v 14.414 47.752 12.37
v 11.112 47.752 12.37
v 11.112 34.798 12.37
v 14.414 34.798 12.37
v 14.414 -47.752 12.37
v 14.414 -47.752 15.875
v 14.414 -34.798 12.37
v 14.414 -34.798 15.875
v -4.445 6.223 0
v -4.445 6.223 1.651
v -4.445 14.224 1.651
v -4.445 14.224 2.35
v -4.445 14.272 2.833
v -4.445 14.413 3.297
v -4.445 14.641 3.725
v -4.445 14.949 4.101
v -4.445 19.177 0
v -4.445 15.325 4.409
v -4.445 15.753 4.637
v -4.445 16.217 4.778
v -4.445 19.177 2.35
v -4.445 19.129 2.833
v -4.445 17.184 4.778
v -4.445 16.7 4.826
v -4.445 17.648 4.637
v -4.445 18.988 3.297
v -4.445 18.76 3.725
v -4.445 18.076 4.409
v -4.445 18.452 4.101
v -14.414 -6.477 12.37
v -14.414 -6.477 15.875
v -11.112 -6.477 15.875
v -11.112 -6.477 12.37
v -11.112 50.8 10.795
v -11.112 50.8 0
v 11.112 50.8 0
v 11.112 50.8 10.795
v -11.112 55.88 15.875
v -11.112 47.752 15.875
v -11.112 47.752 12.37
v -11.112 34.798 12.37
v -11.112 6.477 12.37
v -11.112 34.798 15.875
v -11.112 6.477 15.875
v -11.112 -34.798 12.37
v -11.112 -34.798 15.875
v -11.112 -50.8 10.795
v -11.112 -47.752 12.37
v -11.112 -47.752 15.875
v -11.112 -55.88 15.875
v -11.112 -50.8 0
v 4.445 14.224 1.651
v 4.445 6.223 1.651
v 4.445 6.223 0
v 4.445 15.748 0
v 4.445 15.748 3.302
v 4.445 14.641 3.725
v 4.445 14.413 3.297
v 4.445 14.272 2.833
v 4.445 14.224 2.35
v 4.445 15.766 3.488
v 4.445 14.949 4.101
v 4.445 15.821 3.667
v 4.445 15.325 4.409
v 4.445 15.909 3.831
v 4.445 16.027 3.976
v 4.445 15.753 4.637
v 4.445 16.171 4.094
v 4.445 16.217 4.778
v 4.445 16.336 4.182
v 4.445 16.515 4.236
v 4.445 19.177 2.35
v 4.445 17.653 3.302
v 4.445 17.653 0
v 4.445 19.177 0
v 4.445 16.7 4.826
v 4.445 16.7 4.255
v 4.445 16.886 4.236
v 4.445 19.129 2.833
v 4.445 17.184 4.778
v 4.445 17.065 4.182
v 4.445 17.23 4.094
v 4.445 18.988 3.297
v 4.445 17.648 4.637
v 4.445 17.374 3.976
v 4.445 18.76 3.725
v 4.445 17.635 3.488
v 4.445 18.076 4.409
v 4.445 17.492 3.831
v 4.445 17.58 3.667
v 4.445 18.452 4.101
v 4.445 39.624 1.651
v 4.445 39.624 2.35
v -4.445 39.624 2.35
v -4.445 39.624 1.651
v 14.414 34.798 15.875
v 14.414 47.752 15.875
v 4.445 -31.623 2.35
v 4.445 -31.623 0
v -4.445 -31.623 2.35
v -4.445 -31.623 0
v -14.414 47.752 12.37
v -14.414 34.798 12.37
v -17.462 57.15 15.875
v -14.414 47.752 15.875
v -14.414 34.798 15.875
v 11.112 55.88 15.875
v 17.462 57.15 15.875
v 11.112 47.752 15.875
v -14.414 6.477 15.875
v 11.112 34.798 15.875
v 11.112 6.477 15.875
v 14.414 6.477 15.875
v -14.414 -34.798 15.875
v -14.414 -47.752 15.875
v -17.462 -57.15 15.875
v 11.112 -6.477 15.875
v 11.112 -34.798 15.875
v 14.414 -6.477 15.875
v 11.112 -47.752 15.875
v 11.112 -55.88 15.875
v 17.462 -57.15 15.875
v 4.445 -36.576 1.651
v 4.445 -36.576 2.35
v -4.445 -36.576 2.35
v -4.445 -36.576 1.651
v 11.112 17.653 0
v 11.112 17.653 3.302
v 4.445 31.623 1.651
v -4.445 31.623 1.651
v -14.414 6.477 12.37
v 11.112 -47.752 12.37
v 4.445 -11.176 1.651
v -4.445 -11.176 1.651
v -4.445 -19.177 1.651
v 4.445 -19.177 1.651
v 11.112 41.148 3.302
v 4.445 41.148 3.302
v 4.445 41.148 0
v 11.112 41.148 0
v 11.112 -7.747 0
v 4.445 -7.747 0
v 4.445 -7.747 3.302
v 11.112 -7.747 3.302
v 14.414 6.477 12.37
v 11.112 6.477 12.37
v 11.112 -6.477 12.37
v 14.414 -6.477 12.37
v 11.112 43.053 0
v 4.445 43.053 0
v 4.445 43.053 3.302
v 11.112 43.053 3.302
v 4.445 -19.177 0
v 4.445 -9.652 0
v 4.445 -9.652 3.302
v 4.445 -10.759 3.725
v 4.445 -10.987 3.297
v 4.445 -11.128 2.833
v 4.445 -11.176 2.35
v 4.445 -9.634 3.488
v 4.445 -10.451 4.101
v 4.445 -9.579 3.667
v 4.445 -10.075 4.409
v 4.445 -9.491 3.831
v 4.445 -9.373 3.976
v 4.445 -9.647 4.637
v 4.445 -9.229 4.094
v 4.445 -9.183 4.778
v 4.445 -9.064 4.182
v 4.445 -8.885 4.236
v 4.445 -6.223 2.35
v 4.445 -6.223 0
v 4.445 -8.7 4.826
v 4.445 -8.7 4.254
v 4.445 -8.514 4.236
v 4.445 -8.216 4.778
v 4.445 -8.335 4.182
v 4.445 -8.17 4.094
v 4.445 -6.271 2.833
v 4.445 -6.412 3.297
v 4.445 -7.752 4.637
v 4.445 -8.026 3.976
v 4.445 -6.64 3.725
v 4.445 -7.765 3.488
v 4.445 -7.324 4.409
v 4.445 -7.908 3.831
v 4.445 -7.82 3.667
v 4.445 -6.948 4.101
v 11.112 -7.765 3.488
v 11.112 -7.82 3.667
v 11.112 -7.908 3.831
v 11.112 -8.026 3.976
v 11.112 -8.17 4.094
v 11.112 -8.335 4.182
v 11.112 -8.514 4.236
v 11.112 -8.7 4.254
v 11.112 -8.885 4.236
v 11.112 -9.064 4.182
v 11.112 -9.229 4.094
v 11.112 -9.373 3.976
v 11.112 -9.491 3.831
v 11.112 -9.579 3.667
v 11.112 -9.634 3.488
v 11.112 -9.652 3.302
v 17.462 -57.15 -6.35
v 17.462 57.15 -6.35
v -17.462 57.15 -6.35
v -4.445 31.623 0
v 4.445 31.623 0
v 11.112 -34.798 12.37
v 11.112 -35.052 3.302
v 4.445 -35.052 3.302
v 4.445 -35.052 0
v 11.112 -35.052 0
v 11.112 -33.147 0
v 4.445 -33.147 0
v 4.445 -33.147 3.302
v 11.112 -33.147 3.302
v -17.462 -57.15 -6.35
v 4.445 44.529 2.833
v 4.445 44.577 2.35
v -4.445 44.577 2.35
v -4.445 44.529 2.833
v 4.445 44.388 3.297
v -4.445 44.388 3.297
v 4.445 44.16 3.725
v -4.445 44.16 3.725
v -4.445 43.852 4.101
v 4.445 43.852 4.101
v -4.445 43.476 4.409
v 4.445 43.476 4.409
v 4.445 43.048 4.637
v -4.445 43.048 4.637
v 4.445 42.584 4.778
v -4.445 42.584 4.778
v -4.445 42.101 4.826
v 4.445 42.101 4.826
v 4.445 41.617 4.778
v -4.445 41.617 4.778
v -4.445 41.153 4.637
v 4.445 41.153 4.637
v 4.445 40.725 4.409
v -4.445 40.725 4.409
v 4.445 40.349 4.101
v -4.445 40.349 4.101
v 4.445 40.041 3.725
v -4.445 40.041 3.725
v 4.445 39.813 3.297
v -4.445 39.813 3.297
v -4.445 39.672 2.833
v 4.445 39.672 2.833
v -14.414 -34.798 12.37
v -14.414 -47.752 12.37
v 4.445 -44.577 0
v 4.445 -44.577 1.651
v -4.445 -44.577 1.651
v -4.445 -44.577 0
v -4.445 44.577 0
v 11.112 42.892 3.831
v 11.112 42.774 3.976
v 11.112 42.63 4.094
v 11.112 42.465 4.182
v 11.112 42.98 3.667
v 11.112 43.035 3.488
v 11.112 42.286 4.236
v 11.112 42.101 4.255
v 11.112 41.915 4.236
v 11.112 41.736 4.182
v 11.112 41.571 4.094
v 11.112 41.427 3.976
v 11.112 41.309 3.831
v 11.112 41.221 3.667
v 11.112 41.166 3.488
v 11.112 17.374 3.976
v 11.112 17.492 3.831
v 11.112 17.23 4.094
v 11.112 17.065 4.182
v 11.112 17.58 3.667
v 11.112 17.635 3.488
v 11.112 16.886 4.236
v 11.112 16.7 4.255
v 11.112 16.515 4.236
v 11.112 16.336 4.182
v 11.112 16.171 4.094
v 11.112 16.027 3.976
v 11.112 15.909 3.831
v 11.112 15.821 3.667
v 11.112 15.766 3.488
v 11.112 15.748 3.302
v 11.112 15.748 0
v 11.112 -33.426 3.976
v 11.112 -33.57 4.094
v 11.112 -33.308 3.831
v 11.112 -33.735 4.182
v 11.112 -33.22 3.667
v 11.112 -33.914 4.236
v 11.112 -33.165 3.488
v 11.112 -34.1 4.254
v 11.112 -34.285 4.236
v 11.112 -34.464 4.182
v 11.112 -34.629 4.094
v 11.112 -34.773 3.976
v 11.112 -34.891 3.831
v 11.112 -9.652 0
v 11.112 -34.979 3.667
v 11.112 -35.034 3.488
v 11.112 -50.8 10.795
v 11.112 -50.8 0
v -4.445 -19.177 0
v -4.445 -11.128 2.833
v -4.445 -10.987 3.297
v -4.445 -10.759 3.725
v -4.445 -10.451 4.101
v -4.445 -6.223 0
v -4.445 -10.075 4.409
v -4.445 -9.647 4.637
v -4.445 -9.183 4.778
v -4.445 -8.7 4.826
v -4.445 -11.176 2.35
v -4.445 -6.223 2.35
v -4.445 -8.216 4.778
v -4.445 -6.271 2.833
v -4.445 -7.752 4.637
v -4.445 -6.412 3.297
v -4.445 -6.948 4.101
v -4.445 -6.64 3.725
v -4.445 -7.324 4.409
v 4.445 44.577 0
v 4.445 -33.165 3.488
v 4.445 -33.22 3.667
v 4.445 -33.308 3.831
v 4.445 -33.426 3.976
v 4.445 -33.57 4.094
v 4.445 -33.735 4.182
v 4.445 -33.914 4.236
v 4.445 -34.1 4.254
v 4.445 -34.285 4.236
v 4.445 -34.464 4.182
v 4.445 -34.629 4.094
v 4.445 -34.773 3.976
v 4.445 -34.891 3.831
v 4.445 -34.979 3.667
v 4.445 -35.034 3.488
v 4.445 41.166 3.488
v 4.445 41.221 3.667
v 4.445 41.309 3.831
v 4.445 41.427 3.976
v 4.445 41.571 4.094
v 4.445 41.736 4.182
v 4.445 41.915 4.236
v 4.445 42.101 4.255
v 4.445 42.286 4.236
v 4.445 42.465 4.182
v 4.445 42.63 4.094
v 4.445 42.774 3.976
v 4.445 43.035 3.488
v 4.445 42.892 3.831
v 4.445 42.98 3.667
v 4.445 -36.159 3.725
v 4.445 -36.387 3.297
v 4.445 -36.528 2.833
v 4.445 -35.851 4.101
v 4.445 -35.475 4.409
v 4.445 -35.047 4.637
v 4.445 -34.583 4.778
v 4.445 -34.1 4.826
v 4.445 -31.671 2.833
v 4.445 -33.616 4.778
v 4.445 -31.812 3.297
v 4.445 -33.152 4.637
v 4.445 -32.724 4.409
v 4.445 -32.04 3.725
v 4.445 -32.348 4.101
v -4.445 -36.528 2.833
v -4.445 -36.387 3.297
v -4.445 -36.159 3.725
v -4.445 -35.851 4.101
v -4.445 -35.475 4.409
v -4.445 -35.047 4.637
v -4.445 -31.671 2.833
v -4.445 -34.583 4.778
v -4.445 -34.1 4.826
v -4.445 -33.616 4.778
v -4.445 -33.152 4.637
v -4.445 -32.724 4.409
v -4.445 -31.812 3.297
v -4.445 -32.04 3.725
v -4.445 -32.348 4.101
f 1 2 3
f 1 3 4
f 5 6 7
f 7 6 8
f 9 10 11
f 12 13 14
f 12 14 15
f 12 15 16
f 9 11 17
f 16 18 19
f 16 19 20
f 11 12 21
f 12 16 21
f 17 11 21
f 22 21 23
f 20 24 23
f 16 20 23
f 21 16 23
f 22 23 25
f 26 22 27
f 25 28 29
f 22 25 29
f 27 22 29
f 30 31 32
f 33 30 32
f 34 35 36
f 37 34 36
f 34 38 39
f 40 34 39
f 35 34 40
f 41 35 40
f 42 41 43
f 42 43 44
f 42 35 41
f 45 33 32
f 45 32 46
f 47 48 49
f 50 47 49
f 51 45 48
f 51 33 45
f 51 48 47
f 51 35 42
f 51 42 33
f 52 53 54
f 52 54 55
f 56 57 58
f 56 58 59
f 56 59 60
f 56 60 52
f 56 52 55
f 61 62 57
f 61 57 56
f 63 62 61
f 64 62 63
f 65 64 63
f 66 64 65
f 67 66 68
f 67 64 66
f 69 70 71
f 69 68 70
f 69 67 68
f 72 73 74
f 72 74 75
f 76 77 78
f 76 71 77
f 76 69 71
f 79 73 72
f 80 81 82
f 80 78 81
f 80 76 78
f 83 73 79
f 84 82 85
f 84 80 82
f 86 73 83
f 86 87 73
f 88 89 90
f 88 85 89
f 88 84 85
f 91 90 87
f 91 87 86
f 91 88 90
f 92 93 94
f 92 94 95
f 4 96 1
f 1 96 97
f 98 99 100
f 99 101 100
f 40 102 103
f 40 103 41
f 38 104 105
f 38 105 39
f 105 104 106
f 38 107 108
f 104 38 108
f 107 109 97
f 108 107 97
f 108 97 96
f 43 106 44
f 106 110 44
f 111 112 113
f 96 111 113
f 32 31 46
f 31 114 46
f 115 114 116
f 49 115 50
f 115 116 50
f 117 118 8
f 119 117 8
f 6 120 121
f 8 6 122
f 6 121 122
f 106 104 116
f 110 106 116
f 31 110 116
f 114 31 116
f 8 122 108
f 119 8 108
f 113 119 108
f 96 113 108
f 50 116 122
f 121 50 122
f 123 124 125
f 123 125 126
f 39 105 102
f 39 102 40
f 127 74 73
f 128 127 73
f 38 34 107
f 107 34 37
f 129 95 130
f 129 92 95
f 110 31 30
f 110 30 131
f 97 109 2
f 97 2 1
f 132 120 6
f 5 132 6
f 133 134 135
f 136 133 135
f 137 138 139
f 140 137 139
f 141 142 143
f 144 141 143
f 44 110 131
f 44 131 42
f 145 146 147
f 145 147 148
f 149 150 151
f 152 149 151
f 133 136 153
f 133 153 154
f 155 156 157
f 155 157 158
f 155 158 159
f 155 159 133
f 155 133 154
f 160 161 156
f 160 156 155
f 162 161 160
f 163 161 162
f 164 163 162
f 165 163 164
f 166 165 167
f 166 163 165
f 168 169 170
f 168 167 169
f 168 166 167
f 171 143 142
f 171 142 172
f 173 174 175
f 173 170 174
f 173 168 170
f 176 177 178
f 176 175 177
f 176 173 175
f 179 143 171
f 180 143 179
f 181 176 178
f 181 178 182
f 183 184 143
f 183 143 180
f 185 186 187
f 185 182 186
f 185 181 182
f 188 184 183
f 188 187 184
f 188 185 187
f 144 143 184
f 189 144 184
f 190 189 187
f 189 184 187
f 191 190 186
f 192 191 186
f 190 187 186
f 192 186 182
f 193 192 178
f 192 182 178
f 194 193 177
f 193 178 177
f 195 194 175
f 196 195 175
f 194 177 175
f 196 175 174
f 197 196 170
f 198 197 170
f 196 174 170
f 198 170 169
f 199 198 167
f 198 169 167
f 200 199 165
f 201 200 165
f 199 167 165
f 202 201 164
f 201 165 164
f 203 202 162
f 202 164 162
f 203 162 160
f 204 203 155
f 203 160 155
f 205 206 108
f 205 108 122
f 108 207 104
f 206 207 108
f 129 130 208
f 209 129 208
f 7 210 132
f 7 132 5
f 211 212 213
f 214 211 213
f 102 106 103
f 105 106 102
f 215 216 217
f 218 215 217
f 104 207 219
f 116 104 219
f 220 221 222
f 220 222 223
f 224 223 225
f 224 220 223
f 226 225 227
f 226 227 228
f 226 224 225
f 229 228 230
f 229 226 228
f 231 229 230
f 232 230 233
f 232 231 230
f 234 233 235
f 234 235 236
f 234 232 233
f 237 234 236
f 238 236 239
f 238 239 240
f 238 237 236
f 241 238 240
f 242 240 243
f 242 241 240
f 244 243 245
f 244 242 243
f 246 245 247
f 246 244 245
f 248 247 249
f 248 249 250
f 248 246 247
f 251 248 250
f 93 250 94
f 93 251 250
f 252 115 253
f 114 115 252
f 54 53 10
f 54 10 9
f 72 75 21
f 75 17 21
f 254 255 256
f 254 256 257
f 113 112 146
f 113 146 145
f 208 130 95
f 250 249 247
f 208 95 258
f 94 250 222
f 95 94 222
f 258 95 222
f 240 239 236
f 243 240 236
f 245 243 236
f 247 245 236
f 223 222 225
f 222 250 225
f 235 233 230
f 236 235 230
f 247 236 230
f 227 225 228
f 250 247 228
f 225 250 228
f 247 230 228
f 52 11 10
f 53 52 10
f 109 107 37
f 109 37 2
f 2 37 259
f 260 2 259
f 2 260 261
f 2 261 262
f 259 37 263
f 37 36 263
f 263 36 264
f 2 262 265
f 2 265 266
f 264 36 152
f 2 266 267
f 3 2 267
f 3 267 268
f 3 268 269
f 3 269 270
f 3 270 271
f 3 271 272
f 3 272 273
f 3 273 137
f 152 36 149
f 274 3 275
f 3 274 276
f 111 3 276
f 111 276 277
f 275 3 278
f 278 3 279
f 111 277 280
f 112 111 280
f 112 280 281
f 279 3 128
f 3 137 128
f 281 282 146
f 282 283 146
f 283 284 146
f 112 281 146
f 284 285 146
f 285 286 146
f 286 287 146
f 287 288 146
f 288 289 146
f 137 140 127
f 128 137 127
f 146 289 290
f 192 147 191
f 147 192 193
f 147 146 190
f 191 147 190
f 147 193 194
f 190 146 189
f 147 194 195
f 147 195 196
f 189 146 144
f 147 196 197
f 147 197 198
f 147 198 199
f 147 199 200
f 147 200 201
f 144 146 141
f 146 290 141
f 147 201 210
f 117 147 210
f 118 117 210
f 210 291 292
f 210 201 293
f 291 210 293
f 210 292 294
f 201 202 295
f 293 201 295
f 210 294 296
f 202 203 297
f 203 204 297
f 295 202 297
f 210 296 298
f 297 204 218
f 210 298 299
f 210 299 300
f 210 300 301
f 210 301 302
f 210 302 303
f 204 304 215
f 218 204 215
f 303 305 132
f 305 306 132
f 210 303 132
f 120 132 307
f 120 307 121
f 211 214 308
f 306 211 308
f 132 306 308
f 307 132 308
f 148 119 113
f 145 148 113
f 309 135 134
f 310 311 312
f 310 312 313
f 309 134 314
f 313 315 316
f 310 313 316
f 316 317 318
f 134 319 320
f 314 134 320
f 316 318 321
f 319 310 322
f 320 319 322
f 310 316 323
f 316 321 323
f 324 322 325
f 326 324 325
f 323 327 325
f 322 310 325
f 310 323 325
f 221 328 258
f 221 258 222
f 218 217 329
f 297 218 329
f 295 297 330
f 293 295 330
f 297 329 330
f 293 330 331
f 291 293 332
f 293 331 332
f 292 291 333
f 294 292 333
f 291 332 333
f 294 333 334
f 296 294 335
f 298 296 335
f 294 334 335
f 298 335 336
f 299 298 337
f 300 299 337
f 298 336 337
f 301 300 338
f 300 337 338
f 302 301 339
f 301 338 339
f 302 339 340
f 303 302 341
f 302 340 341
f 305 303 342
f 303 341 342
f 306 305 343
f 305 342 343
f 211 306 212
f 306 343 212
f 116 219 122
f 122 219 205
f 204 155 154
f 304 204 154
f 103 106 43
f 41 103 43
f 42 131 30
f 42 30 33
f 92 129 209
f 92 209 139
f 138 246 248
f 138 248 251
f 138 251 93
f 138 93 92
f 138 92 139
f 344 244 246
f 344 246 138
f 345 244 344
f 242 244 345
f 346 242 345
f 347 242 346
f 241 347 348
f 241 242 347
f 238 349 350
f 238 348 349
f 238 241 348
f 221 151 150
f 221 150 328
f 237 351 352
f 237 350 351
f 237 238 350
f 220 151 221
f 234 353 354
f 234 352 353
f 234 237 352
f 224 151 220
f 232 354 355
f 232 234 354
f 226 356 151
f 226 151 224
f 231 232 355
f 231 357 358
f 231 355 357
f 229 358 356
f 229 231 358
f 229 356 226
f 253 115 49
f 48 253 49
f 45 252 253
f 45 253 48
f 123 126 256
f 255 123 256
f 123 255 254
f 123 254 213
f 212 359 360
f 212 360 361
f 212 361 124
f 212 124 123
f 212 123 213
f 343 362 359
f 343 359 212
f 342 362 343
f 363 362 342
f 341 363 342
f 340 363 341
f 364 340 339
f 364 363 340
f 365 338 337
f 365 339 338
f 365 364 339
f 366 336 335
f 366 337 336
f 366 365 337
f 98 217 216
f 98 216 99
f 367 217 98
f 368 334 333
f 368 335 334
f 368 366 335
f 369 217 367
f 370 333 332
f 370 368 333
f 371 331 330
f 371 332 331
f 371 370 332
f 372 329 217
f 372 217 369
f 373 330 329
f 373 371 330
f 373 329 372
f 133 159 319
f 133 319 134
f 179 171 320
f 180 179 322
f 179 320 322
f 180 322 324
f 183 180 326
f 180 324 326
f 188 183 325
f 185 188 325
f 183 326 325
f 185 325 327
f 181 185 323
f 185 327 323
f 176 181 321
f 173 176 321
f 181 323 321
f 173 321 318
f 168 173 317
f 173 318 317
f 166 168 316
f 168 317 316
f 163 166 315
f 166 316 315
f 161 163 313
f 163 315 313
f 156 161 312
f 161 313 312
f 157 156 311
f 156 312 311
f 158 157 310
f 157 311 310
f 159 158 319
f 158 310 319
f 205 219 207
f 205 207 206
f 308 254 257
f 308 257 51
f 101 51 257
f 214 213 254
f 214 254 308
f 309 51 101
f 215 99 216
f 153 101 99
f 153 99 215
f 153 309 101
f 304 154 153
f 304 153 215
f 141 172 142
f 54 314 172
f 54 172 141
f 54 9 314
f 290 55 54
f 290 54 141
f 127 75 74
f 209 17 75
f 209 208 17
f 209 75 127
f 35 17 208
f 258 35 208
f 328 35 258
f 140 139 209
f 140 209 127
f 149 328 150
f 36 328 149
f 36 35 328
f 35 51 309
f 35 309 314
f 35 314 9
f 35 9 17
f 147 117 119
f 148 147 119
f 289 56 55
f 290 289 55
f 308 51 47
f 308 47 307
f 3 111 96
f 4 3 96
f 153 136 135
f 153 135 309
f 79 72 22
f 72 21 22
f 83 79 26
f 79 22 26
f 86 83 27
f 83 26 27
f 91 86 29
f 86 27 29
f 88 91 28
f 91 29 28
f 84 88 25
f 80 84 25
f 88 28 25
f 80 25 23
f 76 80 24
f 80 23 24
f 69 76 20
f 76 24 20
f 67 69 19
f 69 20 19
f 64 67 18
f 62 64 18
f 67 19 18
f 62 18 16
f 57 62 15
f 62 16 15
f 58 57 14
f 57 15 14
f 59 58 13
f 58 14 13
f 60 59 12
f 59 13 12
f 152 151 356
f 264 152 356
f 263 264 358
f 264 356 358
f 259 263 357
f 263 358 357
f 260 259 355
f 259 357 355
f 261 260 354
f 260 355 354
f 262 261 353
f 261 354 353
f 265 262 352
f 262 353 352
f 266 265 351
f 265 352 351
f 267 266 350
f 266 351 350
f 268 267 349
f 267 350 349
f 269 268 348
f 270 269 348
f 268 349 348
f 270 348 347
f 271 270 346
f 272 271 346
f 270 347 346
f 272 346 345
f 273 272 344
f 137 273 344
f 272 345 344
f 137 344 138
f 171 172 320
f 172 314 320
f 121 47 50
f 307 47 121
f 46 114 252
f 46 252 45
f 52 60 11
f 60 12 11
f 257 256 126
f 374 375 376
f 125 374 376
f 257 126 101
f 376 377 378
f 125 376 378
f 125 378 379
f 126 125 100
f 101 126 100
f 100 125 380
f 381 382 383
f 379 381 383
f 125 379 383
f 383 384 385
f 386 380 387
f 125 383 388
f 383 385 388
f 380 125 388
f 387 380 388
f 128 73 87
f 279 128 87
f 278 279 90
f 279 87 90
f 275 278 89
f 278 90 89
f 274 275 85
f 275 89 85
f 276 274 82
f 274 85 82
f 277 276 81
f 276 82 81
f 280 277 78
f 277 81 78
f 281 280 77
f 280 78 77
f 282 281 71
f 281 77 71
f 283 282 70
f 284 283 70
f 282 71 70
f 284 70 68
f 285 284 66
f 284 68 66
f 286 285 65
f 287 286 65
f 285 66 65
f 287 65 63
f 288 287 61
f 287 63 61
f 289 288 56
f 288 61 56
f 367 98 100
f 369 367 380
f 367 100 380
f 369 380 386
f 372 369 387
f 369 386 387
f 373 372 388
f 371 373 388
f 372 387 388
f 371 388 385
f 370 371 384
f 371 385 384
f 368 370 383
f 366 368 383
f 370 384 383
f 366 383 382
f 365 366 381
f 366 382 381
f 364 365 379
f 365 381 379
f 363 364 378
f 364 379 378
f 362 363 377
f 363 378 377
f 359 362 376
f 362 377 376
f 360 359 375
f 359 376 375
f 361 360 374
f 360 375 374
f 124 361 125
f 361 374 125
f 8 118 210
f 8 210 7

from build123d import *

# Parameters (mm, degrees)
F0_W     = 22.225
F0_H     = 101.6
F1_DEPTH = 6.35
F3_DEPTH = 4.445
F5_DEPTH = 6.6675
F6_W     = 34.925
F6_H     = 114.3
F6_W_2   = 22.225
F6_H_2   = 101.6
F7_DEPTH = 22.225
F8_W     = 3.302
F8_H     = 12.954
F9_DEPTH = 3.5052
F10_SIZE = 5.08


with BuildPart() as f1:
    # F0 (on Top) → F1 (new body)
    with BuildSketch(Plane.XY):
        Rectangle(F0_W, F0_H)
    extrude(amount=-F1_DEPTH)

    # F2 (on Right) → F3 (join, symmetric)
    with BuildSketch(Plane.YZ):
        with BuildLine():
            Line((-44.577, 0), (-31.623, 0))
            Line((-31.623, 0), (-31.623, 2.3495))
            ThreePointArc((-31.623, 2.3495), (-34.0995, 4.826), (-36.576, 2.3495))
            Line((-36.576, 2.3495), (-36.576, 1.651))
            Line((-36.576, 1.651), (-44.577, 1.651))
            Line((-44.577, 1.651), (-44.577, 0))
        make_face()
        with BuildLine():
            Line((-19.177, 0), (-6.223, 0))
            Line((-6.223, 0), (-6.223, 2.3495))
            ThreePointArc((-6.223, 2.3495), (-8.6995, 4.826), (-11.176, 2.3495))
            Line((-11.176, 2.3495), (-11.176, 1.651))
            Line((-11.176, 1.651), (-19.177, 1.651))
            Line((-19.177, 1.651), (-19.177, 0))
        make_face()
        with BuildLine():
            Line((6.223, 0), (19.177, 0))
            Line((19.177, 0), (19.177, 2.3495))
            ThreePointArc((19.177, 2.3495), (16.7005, 4.826), (14.224, 2.3495))
            Line((14.224, 2.3495), (14.224, 1.651))
            Line((14.224, 1.651), (6.223, 1.651))
            Line((6.223, 1.651), (6.223, 0))
        make_face()
        with BuildLine():
            Line((31.623, 0), (44.577, 0))
            Line((44.577, 0), (44.577, 2.3495))
            ThreePointArc((44.577, 2.3495), (42.1005, 4.826), (39.624, 2.3495))
            Line((39.624, 2.3495), (39.624, 1.651))
            Line((39.624, 1.651), (31.623, 1.651))
            Line((31.623, 1.651), (31.623, 0))
        make_face()
    extrude(amount=F3_DEPTH, both=True)

    # F4 (on face) → F5 (join, through all)
    with BuildSketch(Plane.YZ.offset(4.445)):
        with BuildLine():
            ThreePointArc((-33.147, 3.302), (-34.0995, 4.2545), (-35.052, 3.302))
            Line((-35.052, 3.302), (-35.052, 0))
            Line((-35.052, 0), (-33.147, 0))
            Line((-33.147, 0), (-33.147, 3.302))
        make_face()
        with BuildLine():
            Line((-9.652, 3.302), (-9.652, 0))
            Line((-9.652, 0), (-7.747, 0))
            Line((-7.747, 0), (-7.747, 3.302))
            ThreePointArc((-7.747, 3.302), (-8.6995, 4.2545), (-9.652, 3.302))
        make_face()
        with BuildLine():
            Line((15.748, 3.302), (15.748, 0))
            Line((15.748, 0), (17.653, 0))
            Line((17.653, 0), (17.653, 3.302))
            ThreePointArc((17.653, 3.302), (16.7005, 4.2545), (15.748, 3.302))
        make_face()
        with BuildLine():
            Line((41.148, 3.302), (41.148, 0))
            Line((41.148, 0), (43.053, 0))
            Line((43.053, 0), (43.053, 3.302))
            ThreePointArc((43.053, 3.302), (42.1005, 4.2545), (41.148, 3.302))
        make_face()
    extrude(amount=F5_DEPTH)

    # F6 (on face) → F7 (join)
    with BuildSketch(Plane(origin=(0, 0, -6.35), x_dir=(1, 0, 0), z_dir=(0, 0, -1))):
        Rectangle(F6_W, F6_H)
        Rectangle(F6_W_2, F6_H_2, mode=Mode.SUBTRACT)
    extrude(amount=-F7_DEPTH)

    # F8 (on face) → F9 (cut)
    with BuildSketch(Plane.XY.offset(15.875)):
        with Locations((-12.7635, 41.275)):
            Rectangle(F8_W, F8_H)
        with Locations((-12.7635, 0)):
            Rectangle(F8_W, F8_H)
        with Locations((-12.7635, -41.275)):
            Rectangle(F8_W, F8_H)
        with Locations((12.7635, 41.275)):
            Rectangle(F8_W, F8_H)
        with Locations((12.7635, 0)):
            Rectangle(F8_W, F8_H)
        with Locations((12.7635, -41.275)):
            Rectangle(F8_W, F8_H)
    extrude(amount=-F9_DEPTH, mode=Mode.SUBTRACT)

    # F10
    f10_edges = [f1.edges().sort_by_distance(p)[0] for p in [
        (0, 50.8, 15.875),
        (0, -50.8, 15.875),
    ]]
    chamfer(f10_edges, length=F10_SIZE)


solid = f1.part
